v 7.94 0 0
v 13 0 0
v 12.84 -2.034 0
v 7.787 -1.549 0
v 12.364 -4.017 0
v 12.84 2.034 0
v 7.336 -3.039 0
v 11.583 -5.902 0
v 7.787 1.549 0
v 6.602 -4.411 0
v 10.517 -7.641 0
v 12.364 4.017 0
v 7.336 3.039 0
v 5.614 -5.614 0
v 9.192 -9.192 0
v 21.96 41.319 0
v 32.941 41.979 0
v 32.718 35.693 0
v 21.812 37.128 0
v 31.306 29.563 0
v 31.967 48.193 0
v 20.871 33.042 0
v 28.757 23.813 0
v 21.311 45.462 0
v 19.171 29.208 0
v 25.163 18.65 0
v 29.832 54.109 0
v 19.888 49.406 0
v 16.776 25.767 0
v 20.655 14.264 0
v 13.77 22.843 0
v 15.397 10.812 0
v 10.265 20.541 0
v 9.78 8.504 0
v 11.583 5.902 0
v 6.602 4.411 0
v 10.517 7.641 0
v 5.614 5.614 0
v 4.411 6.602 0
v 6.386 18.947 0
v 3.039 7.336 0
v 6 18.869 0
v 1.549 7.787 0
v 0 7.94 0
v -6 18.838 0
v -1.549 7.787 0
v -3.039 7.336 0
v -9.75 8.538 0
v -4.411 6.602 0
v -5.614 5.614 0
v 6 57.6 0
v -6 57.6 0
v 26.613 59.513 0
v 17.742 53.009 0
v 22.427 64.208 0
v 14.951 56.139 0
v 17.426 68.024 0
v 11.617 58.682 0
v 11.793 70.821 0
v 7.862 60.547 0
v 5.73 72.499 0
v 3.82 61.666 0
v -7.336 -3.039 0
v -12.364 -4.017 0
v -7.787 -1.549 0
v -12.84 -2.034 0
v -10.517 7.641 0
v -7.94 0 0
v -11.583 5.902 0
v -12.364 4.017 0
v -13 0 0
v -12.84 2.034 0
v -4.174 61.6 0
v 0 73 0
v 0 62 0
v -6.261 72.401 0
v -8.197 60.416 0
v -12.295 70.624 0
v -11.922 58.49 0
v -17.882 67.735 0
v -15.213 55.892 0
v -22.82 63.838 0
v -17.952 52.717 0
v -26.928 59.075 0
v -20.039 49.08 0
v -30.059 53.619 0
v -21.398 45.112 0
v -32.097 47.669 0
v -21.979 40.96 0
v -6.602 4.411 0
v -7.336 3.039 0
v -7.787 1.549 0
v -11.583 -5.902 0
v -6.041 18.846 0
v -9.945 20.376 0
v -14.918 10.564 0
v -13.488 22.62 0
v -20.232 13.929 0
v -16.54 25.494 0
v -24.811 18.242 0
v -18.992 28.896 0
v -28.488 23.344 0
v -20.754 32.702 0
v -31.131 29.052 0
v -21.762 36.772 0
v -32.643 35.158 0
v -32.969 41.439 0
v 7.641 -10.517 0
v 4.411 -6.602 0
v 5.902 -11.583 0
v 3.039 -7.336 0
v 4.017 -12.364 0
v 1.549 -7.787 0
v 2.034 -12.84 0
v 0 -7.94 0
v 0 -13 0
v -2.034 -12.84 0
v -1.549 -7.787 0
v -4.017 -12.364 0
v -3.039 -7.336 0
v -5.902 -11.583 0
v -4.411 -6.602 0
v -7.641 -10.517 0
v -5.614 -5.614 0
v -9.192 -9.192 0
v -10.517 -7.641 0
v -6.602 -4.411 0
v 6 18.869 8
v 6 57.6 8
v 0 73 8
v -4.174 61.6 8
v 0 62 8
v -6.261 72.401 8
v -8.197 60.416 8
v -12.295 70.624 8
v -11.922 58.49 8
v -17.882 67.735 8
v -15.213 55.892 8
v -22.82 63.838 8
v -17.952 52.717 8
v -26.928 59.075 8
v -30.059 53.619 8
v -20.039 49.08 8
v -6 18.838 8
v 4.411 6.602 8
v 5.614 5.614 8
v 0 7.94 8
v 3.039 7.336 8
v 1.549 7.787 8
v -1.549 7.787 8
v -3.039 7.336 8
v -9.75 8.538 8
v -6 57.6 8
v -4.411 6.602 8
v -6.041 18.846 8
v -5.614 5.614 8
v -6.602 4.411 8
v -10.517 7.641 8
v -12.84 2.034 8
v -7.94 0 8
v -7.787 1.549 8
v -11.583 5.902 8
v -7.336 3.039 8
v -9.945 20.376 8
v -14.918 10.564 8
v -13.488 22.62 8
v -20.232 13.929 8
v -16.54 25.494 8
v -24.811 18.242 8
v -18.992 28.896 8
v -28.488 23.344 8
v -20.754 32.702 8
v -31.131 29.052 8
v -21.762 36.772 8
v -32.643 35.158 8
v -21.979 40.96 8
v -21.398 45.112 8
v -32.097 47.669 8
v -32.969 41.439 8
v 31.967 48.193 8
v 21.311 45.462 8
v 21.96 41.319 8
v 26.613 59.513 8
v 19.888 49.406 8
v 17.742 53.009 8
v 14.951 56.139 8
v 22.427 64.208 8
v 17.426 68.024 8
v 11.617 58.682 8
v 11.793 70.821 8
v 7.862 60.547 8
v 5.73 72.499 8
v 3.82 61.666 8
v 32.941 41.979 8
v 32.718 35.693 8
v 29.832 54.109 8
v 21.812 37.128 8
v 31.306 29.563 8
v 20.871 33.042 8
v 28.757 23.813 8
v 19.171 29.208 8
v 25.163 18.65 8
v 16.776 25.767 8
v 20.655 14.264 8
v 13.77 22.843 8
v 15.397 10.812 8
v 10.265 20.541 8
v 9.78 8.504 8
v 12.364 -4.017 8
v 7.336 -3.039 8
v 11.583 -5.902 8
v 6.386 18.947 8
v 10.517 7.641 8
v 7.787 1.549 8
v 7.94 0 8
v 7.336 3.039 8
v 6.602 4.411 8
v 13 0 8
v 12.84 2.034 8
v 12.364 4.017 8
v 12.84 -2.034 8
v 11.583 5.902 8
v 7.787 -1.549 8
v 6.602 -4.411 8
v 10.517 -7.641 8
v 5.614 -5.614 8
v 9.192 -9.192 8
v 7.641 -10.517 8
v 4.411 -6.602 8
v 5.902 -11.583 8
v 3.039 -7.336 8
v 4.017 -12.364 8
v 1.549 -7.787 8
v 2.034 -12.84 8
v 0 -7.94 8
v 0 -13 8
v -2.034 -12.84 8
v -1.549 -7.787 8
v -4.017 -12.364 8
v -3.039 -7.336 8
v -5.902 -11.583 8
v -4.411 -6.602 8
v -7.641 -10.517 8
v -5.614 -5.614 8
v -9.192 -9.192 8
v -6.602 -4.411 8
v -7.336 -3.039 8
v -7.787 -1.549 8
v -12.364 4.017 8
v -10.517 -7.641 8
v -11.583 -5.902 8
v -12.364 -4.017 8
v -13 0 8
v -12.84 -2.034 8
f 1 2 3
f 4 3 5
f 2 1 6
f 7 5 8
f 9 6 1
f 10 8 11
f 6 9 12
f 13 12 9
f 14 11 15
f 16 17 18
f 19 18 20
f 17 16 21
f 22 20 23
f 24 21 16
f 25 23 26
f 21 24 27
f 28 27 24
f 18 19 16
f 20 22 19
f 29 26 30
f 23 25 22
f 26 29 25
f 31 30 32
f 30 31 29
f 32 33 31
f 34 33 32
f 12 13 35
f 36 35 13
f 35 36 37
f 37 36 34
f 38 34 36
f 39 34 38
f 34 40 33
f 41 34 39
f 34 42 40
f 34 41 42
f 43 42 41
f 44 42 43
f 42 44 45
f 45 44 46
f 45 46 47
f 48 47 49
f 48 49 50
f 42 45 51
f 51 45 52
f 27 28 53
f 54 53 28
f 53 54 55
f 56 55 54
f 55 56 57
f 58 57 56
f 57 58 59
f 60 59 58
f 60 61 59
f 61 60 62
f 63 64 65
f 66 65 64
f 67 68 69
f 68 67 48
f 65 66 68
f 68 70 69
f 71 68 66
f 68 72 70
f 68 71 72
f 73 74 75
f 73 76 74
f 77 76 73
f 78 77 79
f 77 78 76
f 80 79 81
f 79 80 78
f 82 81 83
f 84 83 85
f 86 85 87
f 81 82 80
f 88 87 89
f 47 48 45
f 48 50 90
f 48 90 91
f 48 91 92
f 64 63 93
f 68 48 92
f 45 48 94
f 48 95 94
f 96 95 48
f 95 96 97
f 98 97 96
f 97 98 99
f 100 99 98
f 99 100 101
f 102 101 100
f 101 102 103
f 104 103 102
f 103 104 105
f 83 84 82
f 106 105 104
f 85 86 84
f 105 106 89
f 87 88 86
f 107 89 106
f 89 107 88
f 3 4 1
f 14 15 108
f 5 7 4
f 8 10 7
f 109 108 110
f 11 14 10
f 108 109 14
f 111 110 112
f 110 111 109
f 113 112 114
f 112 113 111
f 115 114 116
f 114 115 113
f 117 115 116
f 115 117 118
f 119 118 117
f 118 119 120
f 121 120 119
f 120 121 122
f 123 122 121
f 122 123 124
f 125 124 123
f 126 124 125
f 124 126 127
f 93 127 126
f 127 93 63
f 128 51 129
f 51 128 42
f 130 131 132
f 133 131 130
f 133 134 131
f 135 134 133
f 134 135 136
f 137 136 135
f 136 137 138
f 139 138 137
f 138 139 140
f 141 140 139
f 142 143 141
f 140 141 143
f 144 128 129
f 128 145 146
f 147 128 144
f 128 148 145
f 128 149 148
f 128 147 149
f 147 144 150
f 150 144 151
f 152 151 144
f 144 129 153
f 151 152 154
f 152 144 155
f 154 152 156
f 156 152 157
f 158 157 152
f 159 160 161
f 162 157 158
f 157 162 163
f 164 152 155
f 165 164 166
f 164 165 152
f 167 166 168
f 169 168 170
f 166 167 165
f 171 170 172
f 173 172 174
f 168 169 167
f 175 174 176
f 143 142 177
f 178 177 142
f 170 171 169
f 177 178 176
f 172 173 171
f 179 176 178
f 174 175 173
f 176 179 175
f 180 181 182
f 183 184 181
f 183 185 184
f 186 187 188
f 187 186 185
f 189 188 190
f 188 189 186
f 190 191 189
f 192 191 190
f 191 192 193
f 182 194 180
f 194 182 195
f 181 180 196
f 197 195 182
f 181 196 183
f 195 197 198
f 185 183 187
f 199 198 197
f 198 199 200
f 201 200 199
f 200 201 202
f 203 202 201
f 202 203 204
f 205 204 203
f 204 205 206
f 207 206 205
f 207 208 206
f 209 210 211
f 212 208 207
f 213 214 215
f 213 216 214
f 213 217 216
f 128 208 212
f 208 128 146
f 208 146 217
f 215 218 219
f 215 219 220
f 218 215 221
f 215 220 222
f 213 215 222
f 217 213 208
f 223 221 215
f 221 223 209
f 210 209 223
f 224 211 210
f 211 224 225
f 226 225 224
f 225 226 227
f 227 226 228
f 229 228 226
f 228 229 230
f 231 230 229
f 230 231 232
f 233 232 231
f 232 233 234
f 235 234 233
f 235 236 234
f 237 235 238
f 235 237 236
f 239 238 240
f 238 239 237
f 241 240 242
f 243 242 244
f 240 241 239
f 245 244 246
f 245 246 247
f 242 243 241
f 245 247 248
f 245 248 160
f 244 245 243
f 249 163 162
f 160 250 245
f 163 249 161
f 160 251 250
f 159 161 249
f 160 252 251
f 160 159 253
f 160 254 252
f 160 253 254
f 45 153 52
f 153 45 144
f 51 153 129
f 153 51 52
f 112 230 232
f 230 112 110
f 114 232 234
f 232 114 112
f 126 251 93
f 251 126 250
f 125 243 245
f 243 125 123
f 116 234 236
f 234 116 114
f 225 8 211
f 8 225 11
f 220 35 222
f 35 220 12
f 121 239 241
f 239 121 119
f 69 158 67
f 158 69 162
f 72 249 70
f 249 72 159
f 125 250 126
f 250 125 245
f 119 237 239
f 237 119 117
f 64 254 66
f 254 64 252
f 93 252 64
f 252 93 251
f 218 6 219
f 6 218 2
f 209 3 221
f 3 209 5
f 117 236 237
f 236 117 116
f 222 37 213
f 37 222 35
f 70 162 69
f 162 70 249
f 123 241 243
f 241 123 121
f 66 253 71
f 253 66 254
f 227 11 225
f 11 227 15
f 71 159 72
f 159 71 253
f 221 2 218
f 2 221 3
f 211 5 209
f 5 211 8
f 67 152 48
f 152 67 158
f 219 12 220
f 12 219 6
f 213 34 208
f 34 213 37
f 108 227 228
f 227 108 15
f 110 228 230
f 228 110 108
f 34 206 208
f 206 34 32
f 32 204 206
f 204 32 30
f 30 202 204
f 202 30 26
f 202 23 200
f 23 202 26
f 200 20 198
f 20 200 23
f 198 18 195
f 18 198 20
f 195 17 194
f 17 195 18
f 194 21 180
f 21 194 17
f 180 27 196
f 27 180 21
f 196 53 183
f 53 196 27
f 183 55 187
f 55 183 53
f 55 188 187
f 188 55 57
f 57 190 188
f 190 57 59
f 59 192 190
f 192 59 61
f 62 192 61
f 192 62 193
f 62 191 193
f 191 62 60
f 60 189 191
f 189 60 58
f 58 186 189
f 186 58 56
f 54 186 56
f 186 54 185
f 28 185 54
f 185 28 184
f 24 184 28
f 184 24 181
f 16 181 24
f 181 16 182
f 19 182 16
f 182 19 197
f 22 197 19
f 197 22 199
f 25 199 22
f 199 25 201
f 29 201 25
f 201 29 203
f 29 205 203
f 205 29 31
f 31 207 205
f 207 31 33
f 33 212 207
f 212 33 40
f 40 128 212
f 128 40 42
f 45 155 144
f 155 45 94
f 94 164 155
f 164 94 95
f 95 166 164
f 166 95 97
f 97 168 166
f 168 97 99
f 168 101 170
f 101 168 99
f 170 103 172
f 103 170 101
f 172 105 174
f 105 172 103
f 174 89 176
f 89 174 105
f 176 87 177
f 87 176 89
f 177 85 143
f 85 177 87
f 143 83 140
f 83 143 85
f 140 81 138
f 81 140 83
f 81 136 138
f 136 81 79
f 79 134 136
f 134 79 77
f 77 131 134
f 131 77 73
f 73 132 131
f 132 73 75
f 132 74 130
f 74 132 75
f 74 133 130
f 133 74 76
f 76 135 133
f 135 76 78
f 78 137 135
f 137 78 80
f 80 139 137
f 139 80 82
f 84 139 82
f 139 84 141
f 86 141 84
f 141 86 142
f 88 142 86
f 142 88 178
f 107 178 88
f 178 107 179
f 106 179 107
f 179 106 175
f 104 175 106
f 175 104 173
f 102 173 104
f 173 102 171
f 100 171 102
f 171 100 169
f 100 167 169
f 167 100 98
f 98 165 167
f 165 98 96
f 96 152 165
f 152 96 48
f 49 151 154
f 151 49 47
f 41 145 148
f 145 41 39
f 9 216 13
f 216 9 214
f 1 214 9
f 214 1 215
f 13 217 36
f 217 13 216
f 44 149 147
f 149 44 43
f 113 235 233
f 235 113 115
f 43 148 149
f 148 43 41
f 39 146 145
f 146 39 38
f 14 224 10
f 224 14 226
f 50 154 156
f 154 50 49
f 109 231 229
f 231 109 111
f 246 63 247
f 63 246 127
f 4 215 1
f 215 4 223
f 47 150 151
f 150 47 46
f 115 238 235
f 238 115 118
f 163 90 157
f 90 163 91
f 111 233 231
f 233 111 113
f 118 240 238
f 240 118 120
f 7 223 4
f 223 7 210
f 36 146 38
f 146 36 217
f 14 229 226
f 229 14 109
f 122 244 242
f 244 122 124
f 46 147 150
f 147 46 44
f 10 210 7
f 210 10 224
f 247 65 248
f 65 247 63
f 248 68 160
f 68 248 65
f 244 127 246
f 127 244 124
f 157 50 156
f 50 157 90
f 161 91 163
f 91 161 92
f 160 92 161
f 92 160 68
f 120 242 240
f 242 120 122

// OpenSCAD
$fn = 32;

// ----------------------------------------------------------------------
// Hook: 80 mm shank into a 22 mm curl, 8 mm thick
// ----------------------------------------------------------------------

// --- parameters (mm) ---
shank_len = 80;           // shank length from the boss centre
shank_w = 12;             // shank width
boss_d = 26;              // boss diameter
bore_d = 15.88;           // boss bore
curl_in = 22;             // curl inner radius
curl_out = 33;            // curl outer radius
curl_sweep = 350;         // curl sweep angle
hook_t = 8;               // hook thickness

shank_profile = [[-6, 57.6], [6, 57.6], [6, 11], [-6, 11]];
boss_profile = [[13, 0], [12.84, 2.034], [12.364, 4.017], [11.583, 5.902], [10.517, 7.641], [9.192, 9.192], [7.641, 10.517], [5.902, 11.583], [4.017, 12.364], [2.034, 12.84], [0, 13], [-2.034, 12.84], [-4.017, 12.364], [-5.902, 11.583], [-7.641, 10.517], [-9.192, 9.192], [-10.517, 7.641], [-11.583, 5.902], [-12.364, 4.017], [-12.84, 2.034], [-13, 0], [-12.84, -2.034], [-12.364, -4.017], [-11.583, -5.902], [-10.517, -7.641], [-9.192, -9.192], [-7.641, -10.517], [-5.902, -11.583], [-4.017, -12.364], [-2.034, -12.84], [0, -13], [2.034, -12.84], [4.017, -12.364], [5.902, -11.583], [7.641, -10.517], [9.192, -9.192], [10.517, -7.641], [11.583, -5.902], [12.364, -4.017], [12.84, -2.034]];
curl_profile = [[0, 73], [-6.261, 72.401], [-12.295, 70.624], [-17.882, 67.735], [-22.82, 63.838], [-26.928, 59.075], [-30.059, 53.619], [-32.097, 47.669], [-32.969, 41.439], [-32.643, 35.158], [-31.131, 29.052], [-28.488, 23.344], [-24.811, 18.242], [-20.232, 13.929], [-14.918, 10.564], [-9.061, 8.268], [-2.876, 7.126], [3.414, 7.177], [9.579, 8.421], [15.397, 10.812], [20.655, 14.264], [25.163, 18.65], [28.757, 23.813], [31.306, 29.563], [32.718, 35.693], [32.941, 41.979], [31.967, 48.193], [29.832, 54.109], [26.613, 59.513], [22.427, 64.208], [17.426, 68.024], [11.793, 70.821], [5.73, 72.499], [3.82, 61.666], [7.862, 60.547], [11.617, 58.682], [14.951, 56.139], [17.742, 53.009], [19.888, 49.406], [21.311, 45.462], [21.96, 41.319], [21.812, 37.128], [20.871, 33.042], [19.171, 29.208], [16.776, 25.767], [13.77, 22.843], [10.265, 20.541], [6.386, 18.947], [2.276, 18.118], [-1.917, 18.084], [-6.041, 18.846], [-9.945, 20.376], [-13.488, 22.62], [-16.54, 25.494], [-18.992, 28.896], [-20.754, 32.702], [-21.762, 36.772], [-21.979, 40.96], [-21.398, 45.112], [-20.039, 49.08], [-17.952, 52.717], [-15.213, 55.892], [-11.922, 58.49], [-8.197, 60.416], [-4.174, 61.6], [0, 62]];

difference() {
  union() {
    /* three overlapping outlines: shank, boss and the smooth curl */
    linear_extrude(height = hook_t) polygon(shank_profile);
    linear_extrude(height = hook_t) polygon(boss_profile);
    linear_extrude(height = hook_t) polygon(curl_profile);
  }
  translate([0, 0, -2.5]) cylinder(h = hook_t + 5, d = bore_d);
}
